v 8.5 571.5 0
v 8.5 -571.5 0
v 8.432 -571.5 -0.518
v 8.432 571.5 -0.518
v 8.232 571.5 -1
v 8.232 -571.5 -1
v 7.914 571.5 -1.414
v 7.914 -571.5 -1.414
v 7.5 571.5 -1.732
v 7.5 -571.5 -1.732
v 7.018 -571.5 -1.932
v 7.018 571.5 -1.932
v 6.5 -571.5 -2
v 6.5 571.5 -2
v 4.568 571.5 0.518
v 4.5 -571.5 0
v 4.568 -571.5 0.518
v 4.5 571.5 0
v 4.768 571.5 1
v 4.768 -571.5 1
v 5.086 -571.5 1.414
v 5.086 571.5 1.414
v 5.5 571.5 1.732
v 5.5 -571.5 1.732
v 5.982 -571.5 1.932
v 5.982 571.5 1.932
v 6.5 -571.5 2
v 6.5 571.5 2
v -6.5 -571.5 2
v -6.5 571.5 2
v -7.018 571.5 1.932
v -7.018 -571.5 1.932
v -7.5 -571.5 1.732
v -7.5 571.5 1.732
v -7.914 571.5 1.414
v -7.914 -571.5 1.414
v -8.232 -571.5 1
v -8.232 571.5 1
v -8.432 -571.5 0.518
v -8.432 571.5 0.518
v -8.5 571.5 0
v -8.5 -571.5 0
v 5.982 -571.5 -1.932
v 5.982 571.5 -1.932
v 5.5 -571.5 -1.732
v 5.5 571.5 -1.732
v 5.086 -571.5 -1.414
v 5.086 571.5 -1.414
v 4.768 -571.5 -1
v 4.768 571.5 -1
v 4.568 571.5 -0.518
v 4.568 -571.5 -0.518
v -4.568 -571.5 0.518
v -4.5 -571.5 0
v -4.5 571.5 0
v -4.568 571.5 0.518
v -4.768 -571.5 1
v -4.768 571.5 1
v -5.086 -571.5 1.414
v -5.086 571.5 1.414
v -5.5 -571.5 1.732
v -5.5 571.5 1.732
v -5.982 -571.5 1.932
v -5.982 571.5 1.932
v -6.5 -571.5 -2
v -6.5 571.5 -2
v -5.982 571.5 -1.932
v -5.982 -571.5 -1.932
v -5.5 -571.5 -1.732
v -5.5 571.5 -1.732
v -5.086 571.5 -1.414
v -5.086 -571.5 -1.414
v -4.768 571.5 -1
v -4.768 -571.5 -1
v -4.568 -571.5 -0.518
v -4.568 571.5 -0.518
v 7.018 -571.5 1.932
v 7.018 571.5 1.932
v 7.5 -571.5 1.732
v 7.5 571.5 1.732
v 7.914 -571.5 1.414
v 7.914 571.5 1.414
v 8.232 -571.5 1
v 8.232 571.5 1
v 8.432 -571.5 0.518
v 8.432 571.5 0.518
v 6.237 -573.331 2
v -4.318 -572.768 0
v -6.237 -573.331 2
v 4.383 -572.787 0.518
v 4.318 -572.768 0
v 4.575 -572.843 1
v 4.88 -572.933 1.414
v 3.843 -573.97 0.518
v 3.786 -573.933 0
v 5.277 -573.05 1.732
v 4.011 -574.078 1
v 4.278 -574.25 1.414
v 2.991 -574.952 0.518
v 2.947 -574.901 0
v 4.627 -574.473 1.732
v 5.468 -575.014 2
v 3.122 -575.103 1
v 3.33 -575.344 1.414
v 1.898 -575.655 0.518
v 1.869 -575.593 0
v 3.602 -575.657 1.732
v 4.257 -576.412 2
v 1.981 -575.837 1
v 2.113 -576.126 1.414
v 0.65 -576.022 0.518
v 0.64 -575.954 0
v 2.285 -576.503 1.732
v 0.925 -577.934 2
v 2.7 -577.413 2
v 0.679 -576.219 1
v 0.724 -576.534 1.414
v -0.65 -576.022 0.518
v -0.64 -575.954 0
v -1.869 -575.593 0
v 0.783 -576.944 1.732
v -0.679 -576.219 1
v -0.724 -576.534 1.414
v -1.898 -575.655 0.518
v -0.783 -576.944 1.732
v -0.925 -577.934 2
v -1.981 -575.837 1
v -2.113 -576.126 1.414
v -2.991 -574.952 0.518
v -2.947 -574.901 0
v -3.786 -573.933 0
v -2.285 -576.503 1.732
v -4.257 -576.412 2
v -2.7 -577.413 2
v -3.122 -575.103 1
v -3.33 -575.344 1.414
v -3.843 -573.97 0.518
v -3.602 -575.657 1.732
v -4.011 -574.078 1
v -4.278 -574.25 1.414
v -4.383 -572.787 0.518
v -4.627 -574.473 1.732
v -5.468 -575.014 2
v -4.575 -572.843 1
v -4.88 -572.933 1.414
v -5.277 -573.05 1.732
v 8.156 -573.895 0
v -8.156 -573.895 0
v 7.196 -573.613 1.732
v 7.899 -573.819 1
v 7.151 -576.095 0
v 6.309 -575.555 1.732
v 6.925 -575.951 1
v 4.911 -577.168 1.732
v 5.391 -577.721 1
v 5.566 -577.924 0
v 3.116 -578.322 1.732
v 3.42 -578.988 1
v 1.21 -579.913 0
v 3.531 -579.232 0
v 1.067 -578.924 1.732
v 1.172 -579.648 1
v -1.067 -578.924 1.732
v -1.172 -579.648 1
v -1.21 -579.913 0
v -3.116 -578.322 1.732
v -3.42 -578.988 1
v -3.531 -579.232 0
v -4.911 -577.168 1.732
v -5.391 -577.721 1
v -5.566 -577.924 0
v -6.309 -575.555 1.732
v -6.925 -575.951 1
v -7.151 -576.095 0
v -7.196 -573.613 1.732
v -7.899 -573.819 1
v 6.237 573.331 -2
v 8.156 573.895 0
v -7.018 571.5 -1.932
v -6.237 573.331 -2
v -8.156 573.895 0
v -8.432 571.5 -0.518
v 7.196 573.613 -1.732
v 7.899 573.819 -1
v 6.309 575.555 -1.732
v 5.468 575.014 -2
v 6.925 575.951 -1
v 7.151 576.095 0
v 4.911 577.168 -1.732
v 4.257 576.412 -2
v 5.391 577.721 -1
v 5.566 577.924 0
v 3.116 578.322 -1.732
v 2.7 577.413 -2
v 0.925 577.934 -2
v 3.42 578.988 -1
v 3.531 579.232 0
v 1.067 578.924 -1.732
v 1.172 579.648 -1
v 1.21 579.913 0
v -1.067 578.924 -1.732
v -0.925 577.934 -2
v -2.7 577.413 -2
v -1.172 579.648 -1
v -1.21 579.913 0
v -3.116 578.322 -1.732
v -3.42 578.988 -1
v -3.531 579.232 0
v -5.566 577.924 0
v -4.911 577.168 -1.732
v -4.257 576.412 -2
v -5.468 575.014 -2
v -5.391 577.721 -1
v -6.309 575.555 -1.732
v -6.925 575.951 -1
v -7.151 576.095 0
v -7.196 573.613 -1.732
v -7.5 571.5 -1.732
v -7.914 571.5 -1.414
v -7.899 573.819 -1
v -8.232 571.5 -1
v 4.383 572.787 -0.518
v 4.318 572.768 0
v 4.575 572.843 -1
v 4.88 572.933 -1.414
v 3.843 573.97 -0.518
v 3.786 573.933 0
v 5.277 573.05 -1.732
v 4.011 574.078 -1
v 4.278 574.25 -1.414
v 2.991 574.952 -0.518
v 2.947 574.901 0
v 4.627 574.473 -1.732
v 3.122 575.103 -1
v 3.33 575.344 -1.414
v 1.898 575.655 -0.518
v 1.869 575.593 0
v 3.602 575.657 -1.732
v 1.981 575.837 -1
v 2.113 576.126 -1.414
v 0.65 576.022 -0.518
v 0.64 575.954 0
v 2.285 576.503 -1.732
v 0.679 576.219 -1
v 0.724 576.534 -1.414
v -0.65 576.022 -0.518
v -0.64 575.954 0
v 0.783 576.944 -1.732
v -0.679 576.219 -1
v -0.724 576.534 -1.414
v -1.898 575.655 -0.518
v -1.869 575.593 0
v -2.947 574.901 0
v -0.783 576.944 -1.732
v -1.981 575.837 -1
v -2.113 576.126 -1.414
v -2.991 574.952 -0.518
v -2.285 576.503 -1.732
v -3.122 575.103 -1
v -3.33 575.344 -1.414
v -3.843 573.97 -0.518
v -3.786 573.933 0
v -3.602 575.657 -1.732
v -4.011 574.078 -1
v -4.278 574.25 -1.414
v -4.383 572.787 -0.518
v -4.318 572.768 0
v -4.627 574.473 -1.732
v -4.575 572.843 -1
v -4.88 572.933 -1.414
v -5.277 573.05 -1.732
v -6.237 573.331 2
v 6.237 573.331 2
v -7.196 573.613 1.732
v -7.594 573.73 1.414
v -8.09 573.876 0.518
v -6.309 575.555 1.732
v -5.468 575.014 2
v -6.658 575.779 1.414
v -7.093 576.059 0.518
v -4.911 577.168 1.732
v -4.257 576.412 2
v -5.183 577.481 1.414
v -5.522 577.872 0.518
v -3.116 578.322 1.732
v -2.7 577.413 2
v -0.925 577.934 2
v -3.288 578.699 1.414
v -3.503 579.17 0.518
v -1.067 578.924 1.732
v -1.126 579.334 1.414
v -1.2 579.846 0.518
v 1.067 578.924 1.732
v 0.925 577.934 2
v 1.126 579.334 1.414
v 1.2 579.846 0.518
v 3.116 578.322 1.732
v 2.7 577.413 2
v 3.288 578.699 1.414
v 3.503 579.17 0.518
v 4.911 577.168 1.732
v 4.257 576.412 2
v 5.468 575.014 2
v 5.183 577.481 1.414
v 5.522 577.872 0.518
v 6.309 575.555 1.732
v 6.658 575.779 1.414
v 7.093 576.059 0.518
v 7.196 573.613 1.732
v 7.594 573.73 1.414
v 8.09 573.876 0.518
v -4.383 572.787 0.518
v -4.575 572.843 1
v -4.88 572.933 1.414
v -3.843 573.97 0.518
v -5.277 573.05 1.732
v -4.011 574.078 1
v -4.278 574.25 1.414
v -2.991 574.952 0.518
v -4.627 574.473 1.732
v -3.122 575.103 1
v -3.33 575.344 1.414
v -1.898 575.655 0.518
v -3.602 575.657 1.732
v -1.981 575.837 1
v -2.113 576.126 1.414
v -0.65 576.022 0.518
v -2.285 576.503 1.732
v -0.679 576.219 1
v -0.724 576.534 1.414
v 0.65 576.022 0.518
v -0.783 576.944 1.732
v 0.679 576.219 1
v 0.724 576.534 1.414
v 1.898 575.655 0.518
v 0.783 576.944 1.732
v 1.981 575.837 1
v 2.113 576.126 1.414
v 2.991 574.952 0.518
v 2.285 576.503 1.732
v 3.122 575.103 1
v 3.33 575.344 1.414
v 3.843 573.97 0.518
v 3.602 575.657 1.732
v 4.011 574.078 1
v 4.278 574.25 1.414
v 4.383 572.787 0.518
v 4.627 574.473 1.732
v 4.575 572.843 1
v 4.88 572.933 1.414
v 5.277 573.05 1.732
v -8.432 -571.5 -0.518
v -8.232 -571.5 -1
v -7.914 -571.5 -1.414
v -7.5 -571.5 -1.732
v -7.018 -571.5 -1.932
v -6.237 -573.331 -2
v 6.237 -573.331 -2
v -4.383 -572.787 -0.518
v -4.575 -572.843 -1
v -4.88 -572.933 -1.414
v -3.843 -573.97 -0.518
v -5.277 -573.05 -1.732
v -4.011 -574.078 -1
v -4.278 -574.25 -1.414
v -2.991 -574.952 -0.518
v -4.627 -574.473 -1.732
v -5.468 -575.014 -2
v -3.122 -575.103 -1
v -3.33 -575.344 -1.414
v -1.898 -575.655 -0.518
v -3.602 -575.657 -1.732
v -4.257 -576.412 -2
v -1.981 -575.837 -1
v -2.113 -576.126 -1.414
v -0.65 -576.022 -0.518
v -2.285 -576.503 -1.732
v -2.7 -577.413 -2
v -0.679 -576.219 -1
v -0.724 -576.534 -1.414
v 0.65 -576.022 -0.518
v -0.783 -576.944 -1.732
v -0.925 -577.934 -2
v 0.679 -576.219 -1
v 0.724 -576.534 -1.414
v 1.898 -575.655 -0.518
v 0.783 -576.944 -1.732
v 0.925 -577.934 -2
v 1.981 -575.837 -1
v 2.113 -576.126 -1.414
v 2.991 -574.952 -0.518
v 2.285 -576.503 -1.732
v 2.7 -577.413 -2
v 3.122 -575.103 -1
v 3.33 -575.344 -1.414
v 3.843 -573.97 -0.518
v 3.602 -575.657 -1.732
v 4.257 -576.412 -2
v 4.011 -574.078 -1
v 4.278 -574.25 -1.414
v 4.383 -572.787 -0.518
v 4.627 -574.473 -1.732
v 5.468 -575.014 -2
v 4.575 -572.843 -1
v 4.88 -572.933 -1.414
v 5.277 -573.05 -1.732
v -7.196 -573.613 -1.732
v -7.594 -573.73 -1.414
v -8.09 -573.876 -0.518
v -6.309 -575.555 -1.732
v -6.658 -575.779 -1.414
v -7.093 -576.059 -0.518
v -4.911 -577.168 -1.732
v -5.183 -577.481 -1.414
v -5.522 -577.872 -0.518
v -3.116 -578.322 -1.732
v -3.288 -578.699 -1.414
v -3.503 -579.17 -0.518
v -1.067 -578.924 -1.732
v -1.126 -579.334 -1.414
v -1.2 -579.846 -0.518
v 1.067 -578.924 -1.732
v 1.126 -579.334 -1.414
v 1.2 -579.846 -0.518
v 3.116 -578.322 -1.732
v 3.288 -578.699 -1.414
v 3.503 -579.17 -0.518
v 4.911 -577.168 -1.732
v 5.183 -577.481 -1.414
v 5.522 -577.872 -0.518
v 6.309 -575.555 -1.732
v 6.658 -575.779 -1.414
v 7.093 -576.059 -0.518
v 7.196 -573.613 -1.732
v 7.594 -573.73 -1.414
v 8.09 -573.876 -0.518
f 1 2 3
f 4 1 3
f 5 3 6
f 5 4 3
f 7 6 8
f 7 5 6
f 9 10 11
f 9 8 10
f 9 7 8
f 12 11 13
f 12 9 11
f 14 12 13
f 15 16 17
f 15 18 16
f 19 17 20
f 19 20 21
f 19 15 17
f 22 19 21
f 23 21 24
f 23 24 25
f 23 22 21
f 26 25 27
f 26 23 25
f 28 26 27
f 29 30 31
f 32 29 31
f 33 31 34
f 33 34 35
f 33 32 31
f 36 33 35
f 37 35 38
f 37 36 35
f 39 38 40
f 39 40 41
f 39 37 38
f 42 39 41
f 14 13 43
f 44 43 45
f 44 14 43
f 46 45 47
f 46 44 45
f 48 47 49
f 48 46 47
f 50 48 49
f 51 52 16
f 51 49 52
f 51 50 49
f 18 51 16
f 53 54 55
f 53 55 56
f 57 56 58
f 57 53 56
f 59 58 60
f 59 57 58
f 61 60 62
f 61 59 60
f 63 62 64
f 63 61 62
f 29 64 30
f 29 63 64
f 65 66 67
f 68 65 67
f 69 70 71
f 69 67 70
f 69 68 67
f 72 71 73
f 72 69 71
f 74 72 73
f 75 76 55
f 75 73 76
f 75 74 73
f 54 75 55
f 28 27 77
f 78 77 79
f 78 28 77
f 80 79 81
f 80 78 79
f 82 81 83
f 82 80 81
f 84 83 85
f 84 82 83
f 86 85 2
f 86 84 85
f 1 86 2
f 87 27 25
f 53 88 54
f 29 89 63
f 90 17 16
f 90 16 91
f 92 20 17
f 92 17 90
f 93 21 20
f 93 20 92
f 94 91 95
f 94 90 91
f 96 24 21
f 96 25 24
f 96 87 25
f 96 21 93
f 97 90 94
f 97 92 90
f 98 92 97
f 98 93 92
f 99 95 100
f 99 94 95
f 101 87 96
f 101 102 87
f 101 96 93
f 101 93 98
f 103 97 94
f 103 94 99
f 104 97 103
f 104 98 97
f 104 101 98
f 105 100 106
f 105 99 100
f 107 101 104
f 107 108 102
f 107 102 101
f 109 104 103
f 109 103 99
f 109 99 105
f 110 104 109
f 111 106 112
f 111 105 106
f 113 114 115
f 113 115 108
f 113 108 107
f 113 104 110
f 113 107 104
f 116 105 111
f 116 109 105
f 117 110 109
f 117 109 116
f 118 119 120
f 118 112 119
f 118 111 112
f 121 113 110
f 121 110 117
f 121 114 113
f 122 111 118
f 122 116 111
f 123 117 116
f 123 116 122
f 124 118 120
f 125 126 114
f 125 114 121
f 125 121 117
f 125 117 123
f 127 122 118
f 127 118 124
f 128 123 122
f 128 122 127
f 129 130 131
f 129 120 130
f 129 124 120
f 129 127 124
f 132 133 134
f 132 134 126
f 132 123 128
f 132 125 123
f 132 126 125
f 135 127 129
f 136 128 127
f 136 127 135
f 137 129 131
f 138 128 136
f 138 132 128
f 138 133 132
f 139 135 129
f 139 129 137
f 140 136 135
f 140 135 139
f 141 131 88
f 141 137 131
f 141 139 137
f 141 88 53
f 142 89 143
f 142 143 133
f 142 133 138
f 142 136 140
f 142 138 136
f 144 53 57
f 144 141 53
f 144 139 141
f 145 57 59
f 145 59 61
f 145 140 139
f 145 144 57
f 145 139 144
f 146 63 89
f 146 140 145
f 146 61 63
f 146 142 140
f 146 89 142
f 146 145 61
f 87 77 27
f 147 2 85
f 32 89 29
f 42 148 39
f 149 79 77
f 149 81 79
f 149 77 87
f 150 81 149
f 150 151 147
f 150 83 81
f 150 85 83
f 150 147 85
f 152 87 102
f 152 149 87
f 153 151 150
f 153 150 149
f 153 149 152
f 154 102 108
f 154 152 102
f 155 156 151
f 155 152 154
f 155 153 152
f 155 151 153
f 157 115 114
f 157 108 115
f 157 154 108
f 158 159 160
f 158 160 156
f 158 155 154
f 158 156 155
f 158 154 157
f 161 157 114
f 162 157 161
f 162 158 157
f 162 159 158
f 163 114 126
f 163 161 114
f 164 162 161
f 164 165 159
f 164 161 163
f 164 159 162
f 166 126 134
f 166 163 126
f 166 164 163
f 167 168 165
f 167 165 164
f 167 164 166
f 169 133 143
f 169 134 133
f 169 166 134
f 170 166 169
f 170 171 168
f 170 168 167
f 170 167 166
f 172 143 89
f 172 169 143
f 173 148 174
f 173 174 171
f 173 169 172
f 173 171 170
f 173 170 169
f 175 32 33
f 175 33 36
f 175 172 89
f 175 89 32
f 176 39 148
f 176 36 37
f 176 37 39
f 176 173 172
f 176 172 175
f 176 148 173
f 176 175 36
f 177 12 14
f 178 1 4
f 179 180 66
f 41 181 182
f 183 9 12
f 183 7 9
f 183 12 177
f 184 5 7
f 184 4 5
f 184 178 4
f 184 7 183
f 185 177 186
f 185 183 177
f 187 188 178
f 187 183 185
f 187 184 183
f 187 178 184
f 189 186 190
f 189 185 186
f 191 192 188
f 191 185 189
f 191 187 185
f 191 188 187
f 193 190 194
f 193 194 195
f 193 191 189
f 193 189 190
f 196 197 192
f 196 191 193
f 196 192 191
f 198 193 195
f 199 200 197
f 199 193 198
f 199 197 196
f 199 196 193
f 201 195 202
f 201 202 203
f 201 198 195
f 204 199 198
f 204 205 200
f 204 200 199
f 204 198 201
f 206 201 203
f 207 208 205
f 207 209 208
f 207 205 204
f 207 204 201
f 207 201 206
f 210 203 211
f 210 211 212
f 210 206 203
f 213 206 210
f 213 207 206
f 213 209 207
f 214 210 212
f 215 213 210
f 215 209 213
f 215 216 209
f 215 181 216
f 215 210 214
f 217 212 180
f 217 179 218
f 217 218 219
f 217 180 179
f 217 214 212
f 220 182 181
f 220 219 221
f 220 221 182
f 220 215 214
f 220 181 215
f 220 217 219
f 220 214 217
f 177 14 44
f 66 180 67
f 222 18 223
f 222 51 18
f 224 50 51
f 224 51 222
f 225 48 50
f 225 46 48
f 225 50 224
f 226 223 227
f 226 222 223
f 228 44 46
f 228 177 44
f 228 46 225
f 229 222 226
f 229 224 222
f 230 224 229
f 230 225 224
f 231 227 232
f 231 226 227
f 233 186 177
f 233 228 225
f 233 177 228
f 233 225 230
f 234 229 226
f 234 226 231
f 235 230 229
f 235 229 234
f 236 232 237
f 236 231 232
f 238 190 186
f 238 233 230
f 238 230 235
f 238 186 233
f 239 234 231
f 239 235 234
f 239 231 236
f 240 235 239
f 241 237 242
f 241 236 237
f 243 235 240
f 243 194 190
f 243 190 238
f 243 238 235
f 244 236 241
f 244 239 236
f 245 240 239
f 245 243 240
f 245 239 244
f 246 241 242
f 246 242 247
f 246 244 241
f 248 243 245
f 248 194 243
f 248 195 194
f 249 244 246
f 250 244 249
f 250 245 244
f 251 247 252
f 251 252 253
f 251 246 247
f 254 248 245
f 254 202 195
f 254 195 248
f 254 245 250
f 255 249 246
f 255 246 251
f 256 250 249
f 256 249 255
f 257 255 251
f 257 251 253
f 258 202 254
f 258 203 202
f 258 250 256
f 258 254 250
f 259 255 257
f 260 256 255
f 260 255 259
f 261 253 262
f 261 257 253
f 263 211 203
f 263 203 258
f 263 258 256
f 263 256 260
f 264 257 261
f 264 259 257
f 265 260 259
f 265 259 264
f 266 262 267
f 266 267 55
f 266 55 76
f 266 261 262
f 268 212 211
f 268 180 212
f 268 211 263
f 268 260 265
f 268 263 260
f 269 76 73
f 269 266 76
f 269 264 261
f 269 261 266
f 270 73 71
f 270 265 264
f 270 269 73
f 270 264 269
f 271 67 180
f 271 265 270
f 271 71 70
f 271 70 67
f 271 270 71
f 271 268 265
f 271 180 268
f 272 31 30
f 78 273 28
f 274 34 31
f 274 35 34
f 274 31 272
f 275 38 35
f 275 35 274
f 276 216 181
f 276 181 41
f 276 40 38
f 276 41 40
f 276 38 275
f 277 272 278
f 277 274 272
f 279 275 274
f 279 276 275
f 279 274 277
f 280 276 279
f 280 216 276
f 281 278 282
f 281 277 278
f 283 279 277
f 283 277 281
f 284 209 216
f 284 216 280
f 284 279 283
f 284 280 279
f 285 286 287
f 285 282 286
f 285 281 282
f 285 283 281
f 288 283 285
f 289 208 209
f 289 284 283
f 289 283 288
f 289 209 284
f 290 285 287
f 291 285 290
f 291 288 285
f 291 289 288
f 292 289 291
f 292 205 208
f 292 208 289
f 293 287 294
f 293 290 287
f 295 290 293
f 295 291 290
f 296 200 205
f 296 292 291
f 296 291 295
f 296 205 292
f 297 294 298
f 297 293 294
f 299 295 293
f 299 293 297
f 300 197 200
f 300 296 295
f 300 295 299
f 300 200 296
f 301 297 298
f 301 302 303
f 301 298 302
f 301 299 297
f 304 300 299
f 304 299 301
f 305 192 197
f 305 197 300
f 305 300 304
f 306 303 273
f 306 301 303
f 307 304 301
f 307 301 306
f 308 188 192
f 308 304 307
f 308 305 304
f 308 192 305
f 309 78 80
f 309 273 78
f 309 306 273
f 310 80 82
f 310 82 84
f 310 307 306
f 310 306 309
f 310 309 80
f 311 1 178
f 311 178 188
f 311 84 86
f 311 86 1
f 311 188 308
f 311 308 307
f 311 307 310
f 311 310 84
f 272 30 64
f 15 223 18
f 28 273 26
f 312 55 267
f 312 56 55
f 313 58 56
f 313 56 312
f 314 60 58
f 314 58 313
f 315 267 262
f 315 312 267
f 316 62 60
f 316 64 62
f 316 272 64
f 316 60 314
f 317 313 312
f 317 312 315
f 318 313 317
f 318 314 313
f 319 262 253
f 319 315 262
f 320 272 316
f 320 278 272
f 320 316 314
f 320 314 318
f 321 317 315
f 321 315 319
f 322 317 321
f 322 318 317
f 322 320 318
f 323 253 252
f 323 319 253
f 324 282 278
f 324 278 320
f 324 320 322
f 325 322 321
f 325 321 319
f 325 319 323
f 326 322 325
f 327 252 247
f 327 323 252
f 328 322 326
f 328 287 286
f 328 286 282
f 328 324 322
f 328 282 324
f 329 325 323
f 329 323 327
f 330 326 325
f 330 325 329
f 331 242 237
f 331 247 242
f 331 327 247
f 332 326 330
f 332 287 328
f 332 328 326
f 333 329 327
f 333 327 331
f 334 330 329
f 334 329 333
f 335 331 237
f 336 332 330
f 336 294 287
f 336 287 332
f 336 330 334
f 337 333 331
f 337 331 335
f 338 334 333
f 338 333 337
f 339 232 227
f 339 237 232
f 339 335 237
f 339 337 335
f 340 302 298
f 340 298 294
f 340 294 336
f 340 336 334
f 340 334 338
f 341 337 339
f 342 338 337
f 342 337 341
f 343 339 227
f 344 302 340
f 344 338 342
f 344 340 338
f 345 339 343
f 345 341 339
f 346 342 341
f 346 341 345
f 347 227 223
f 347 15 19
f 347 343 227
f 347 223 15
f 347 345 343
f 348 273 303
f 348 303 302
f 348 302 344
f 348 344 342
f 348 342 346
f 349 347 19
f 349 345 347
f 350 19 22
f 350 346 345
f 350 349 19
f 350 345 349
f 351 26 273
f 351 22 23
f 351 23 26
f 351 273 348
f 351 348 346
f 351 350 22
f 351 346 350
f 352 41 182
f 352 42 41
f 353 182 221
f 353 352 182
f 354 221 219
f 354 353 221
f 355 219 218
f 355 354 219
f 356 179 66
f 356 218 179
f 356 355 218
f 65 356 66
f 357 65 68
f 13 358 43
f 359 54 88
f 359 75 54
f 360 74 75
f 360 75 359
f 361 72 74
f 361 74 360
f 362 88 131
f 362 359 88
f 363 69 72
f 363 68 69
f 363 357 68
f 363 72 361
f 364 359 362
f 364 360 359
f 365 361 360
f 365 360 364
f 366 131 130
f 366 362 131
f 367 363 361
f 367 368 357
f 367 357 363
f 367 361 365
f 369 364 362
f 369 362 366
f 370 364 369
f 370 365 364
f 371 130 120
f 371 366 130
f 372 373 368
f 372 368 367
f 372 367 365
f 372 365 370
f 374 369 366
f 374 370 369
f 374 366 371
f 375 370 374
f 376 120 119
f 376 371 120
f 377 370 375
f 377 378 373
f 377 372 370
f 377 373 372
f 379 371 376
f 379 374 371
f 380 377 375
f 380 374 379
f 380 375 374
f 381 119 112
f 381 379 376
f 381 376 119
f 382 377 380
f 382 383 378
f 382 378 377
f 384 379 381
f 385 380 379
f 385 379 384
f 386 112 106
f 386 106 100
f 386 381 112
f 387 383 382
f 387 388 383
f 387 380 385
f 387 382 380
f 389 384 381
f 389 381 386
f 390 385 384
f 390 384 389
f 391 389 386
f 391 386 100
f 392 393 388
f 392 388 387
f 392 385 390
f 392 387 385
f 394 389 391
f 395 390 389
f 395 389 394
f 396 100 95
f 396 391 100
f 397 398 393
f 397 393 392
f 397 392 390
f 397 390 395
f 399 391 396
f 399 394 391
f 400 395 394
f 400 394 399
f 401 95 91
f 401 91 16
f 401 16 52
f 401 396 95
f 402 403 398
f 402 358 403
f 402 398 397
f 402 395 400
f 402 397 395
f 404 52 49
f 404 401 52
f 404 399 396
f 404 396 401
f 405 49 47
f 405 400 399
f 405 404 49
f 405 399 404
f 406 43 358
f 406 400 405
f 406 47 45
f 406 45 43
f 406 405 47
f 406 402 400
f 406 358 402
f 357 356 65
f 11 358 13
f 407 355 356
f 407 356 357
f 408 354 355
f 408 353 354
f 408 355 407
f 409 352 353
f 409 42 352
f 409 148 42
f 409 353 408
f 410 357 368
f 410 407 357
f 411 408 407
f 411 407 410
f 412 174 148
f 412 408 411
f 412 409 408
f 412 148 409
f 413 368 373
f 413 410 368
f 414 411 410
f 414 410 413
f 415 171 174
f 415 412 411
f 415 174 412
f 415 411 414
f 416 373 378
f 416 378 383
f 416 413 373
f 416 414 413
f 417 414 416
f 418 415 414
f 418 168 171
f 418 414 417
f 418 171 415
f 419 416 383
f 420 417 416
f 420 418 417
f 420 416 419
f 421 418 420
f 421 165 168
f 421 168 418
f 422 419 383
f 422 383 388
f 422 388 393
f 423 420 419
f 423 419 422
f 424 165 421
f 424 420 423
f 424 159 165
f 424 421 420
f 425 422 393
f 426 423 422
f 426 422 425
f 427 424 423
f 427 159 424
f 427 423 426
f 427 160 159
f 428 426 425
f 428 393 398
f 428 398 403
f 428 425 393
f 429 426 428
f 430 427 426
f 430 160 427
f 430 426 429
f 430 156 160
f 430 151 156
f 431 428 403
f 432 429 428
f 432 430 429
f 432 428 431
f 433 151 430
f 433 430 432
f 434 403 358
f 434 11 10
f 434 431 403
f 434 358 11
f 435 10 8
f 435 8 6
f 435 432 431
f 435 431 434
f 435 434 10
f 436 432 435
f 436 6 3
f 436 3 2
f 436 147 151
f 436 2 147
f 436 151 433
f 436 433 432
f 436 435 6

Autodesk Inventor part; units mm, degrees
ref_plane "YZ Plane" through (0, 0, 0) normal (1, 0, 0) x (0, 1, 0)
ref_plane "XZ Plane" through (0, 0, 0) normal (0, 1, 0) x (-1, 0, 0)
ref_plane "XY Plane" through (0, 0, 0) normal (0, 0, 1) x (1, 0, 0)
sketch "Sketch1" plane through (0, 0, 0) normal (0, 0, 1) x (1, 0, 0)
  line L0 (0, 571.5) -> (0, -571.5) construction
  line L1 (-6.5, 571.5) -> (-6.5, -571.5)
  line L2 (6.5, -571.5) -> (6.5, 571.5)
  arc A0 (6.5, 571.5) -> (-6.5, 571.5) centre (0, 571.5) ccw
  arc A1 (-6.5, -571.5) -> (6.5, -571.5) centre (0, -571.5) ccw
  line L3 (-4.5, 571.5) -> (-4.5, -571.5)
  arc A2 (-4.5, -571.5) -> (4.5, -571.5) centre (0, -571.5) ccw
  line L4 (4.5, -571.5) -> (4.5, 571.5)
  arc A3 (4.5, 571.5) -> (-4.5, 571.5) centre (0, 571.5) ccw
  line L5 (-8.5, 571.5) -> (-8.5, -571.5)
  arc A4 (-8.5, -571.5) -> (8.5, -571.5) centre (0, -571.5) ccw
  line L6 (8.5, -571.5) -> (8.5, 571.5)
  arc A5 (8.5, 571.5) -> (-8.5, 571.5) centre (0, 571.5) ccw
  point P0 (0, 0)
  dimension "d0" = 9
  dimension "d2" = 2
  dimension "d3" = 2
  dimension "d4" = 1143
extrude "Extrusion1" add sketch "Sketch1" along normal mid plane 4 contours A0 L2 A1 L1 | A5 L6 A4 L5
fillet "Fillet1" radius 2 16 edges at (0, -580, 2) (8.5, 0, 2) (0, 580, 2) (-8.5, 0, 2) (0, 576, 2) (4.5, 0, 2) (0, -576, 2) (-4.5, 0, 2) (0, -576, -2) (4.5, 0, -2) (0, 576, -2) (-4.5, 0, -2) (0, 580, -2) (8.5, 0, -2) (0, -580, -2) (-8.5, 0, -2)
properties part number "REVLIFT-Test String" material "Nylon 6"
